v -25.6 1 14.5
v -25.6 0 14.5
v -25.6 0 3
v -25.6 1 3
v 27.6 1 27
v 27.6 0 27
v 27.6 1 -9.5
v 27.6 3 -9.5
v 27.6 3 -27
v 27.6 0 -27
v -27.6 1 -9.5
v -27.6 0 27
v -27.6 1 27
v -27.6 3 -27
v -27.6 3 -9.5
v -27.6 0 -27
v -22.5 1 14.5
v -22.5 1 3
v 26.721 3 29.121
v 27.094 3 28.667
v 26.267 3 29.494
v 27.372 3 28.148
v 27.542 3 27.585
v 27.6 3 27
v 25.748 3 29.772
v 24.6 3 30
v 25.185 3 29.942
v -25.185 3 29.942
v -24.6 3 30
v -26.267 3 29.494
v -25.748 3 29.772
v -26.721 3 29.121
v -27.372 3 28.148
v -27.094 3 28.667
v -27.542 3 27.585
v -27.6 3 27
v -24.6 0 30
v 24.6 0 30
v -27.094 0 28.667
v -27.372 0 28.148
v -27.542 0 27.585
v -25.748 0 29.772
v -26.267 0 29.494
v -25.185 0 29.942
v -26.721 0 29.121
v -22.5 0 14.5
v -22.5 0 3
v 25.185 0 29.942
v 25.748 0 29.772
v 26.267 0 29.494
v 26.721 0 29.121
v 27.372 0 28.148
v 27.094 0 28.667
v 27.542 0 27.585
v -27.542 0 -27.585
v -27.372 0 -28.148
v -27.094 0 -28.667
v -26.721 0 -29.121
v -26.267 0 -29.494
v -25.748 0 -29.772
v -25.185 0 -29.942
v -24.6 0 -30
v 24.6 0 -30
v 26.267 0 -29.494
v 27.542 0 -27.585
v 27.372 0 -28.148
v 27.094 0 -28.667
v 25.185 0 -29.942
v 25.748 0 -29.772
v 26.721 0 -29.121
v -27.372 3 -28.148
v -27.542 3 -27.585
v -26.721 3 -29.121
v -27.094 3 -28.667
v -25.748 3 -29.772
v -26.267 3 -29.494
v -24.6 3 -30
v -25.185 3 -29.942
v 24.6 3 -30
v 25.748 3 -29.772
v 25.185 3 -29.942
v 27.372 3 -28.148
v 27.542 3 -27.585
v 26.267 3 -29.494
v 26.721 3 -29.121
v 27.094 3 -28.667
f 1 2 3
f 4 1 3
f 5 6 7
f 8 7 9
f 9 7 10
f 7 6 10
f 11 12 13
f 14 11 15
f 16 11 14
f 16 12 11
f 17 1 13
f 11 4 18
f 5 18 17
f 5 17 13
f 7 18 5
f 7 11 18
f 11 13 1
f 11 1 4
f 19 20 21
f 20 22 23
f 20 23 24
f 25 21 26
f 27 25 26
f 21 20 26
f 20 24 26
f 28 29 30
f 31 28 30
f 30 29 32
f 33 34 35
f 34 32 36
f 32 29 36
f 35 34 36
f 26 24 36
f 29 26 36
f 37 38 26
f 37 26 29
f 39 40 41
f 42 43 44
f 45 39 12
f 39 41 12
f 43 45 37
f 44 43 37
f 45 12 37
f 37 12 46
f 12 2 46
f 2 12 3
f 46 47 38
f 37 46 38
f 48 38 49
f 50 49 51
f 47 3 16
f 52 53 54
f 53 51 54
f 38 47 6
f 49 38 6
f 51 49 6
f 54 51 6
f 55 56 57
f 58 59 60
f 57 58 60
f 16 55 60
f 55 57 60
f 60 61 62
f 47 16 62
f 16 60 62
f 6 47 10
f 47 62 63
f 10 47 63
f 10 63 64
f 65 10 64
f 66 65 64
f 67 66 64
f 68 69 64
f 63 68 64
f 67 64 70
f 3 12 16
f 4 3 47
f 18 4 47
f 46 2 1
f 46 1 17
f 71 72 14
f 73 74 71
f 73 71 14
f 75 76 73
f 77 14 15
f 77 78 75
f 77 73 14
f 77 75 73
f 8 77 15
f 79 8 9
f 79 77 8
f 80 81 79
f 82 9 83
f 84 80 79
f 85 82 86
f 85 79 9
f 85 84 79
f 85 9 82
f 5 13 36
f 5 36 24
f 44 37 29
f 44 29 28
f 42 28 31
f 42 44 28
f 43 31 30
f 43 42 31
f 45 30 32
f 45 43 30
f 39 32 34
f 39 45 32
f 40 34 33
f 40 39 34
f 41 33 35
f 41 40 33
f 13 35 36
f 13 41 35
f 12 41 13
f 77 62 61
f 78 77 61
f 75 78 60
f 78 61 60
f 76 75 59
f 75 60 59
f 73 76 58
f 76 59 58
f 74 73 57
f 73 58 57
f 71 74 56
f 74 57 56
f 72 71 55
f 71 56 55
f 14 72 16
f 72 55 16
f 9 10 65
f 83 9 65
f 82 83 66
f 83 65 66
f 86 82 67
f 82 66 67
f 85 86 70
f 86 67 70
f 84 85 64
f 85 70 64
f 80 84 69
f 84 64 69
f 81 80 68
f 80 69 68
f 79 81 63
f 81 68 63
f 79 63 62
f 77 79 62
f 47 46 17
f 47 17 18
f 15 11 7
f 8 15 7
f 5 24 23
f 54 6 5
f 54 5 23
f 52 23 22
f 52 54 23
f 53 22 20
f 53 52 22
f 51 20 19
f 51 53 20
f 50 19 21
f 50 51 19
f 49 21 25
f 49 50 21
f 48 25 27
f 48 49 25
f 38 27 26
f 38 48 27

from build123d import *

# Parameters (mm, degrees)
BOSS_EXTRUDE1_DEPTH   = 3
BOSS_EXTRUDE1_2_DEPTH = 3
SKETCH1_5_W           = 55.2
SKETCH1_5_H           = 36.5
SKETCH1_5_W_2         = 3.1
SKETCH1_5_H_2         = 11.5
BOSS_EXTRUDE2_DEPTH   = 1


with BuildPart() as part:
    # Sketch1 → Boss-Extrude1 (new body)
    with BuildSketch(Plane(origin=(0, 0, 0), x_dir=(1, 0, 0), z_dir=(0, 1, 0))):
        with BuildLine():
            ThreePointArc((-27.6, -27), (-26.721320344, -29.121320344), (-24.6, -30))
            Line((-24.6, -30), (24.6, -30))
            ThreePointArc((24.6, -30), (26.721320344, -29.121320344), (27.6, -27))
            Line((27.6, -27), (-27.6, -27))
        make_face()
    extrude(amount=BOSS_EXTRUDE1_DEPTH)



with BuildPart() as body_2:
    # Sketch1 → Boss-Extrude1 2 (new body)
    with BuildSketch(Plane(origin=(0, 0, 0), x_dir=(1, 0, 0), z_dir=(0, 1, 0))):
        with BuildLine():
            Line((-27.6, 27), (-27.6, 9.5))
            Line((-27.6, 9.5), (27.6, 9.5))
            Line((27.6, 9.5), (27.6, 27))
            ThreePointArc((27.6, 27), (26.721320344, 29.121320344), (24.6, 30))
            Line((24.6, 30), (-24.6, 30))
            ThreePointArc((-24.6, 30), (-26.721320344, 29.121320344), (-27.6, 27))
        make_face()
    extrude(amount=BOSS_EXTRUDE1_2_DEPTH)


with BuildPart() as part_1:
    add(part.part)

    add(body_2.part)  # Boss-Extrude2 merges body 2
    # Sketch1<5> → Boss-Extrude2 (add)
    with BuildSketch(Plane(origin=(0, 0, 0), x_dir=(1, 0, 0), z_dir=(0, 1, 0))):
        with Locations((0, -8.75)):
            Rectangle(SKETCH1_5_W, SKETCH1_5_H)
        with Locations((-24.05, -8.75)):
            Rectangle(SKETCH1_5_W_2, SKETCH1_5_H_2, mode=Mode.SUBTRACT)
    extrude(amount=BOSS_EXTRUDE2_DEPTH)


solid = part_1.part
